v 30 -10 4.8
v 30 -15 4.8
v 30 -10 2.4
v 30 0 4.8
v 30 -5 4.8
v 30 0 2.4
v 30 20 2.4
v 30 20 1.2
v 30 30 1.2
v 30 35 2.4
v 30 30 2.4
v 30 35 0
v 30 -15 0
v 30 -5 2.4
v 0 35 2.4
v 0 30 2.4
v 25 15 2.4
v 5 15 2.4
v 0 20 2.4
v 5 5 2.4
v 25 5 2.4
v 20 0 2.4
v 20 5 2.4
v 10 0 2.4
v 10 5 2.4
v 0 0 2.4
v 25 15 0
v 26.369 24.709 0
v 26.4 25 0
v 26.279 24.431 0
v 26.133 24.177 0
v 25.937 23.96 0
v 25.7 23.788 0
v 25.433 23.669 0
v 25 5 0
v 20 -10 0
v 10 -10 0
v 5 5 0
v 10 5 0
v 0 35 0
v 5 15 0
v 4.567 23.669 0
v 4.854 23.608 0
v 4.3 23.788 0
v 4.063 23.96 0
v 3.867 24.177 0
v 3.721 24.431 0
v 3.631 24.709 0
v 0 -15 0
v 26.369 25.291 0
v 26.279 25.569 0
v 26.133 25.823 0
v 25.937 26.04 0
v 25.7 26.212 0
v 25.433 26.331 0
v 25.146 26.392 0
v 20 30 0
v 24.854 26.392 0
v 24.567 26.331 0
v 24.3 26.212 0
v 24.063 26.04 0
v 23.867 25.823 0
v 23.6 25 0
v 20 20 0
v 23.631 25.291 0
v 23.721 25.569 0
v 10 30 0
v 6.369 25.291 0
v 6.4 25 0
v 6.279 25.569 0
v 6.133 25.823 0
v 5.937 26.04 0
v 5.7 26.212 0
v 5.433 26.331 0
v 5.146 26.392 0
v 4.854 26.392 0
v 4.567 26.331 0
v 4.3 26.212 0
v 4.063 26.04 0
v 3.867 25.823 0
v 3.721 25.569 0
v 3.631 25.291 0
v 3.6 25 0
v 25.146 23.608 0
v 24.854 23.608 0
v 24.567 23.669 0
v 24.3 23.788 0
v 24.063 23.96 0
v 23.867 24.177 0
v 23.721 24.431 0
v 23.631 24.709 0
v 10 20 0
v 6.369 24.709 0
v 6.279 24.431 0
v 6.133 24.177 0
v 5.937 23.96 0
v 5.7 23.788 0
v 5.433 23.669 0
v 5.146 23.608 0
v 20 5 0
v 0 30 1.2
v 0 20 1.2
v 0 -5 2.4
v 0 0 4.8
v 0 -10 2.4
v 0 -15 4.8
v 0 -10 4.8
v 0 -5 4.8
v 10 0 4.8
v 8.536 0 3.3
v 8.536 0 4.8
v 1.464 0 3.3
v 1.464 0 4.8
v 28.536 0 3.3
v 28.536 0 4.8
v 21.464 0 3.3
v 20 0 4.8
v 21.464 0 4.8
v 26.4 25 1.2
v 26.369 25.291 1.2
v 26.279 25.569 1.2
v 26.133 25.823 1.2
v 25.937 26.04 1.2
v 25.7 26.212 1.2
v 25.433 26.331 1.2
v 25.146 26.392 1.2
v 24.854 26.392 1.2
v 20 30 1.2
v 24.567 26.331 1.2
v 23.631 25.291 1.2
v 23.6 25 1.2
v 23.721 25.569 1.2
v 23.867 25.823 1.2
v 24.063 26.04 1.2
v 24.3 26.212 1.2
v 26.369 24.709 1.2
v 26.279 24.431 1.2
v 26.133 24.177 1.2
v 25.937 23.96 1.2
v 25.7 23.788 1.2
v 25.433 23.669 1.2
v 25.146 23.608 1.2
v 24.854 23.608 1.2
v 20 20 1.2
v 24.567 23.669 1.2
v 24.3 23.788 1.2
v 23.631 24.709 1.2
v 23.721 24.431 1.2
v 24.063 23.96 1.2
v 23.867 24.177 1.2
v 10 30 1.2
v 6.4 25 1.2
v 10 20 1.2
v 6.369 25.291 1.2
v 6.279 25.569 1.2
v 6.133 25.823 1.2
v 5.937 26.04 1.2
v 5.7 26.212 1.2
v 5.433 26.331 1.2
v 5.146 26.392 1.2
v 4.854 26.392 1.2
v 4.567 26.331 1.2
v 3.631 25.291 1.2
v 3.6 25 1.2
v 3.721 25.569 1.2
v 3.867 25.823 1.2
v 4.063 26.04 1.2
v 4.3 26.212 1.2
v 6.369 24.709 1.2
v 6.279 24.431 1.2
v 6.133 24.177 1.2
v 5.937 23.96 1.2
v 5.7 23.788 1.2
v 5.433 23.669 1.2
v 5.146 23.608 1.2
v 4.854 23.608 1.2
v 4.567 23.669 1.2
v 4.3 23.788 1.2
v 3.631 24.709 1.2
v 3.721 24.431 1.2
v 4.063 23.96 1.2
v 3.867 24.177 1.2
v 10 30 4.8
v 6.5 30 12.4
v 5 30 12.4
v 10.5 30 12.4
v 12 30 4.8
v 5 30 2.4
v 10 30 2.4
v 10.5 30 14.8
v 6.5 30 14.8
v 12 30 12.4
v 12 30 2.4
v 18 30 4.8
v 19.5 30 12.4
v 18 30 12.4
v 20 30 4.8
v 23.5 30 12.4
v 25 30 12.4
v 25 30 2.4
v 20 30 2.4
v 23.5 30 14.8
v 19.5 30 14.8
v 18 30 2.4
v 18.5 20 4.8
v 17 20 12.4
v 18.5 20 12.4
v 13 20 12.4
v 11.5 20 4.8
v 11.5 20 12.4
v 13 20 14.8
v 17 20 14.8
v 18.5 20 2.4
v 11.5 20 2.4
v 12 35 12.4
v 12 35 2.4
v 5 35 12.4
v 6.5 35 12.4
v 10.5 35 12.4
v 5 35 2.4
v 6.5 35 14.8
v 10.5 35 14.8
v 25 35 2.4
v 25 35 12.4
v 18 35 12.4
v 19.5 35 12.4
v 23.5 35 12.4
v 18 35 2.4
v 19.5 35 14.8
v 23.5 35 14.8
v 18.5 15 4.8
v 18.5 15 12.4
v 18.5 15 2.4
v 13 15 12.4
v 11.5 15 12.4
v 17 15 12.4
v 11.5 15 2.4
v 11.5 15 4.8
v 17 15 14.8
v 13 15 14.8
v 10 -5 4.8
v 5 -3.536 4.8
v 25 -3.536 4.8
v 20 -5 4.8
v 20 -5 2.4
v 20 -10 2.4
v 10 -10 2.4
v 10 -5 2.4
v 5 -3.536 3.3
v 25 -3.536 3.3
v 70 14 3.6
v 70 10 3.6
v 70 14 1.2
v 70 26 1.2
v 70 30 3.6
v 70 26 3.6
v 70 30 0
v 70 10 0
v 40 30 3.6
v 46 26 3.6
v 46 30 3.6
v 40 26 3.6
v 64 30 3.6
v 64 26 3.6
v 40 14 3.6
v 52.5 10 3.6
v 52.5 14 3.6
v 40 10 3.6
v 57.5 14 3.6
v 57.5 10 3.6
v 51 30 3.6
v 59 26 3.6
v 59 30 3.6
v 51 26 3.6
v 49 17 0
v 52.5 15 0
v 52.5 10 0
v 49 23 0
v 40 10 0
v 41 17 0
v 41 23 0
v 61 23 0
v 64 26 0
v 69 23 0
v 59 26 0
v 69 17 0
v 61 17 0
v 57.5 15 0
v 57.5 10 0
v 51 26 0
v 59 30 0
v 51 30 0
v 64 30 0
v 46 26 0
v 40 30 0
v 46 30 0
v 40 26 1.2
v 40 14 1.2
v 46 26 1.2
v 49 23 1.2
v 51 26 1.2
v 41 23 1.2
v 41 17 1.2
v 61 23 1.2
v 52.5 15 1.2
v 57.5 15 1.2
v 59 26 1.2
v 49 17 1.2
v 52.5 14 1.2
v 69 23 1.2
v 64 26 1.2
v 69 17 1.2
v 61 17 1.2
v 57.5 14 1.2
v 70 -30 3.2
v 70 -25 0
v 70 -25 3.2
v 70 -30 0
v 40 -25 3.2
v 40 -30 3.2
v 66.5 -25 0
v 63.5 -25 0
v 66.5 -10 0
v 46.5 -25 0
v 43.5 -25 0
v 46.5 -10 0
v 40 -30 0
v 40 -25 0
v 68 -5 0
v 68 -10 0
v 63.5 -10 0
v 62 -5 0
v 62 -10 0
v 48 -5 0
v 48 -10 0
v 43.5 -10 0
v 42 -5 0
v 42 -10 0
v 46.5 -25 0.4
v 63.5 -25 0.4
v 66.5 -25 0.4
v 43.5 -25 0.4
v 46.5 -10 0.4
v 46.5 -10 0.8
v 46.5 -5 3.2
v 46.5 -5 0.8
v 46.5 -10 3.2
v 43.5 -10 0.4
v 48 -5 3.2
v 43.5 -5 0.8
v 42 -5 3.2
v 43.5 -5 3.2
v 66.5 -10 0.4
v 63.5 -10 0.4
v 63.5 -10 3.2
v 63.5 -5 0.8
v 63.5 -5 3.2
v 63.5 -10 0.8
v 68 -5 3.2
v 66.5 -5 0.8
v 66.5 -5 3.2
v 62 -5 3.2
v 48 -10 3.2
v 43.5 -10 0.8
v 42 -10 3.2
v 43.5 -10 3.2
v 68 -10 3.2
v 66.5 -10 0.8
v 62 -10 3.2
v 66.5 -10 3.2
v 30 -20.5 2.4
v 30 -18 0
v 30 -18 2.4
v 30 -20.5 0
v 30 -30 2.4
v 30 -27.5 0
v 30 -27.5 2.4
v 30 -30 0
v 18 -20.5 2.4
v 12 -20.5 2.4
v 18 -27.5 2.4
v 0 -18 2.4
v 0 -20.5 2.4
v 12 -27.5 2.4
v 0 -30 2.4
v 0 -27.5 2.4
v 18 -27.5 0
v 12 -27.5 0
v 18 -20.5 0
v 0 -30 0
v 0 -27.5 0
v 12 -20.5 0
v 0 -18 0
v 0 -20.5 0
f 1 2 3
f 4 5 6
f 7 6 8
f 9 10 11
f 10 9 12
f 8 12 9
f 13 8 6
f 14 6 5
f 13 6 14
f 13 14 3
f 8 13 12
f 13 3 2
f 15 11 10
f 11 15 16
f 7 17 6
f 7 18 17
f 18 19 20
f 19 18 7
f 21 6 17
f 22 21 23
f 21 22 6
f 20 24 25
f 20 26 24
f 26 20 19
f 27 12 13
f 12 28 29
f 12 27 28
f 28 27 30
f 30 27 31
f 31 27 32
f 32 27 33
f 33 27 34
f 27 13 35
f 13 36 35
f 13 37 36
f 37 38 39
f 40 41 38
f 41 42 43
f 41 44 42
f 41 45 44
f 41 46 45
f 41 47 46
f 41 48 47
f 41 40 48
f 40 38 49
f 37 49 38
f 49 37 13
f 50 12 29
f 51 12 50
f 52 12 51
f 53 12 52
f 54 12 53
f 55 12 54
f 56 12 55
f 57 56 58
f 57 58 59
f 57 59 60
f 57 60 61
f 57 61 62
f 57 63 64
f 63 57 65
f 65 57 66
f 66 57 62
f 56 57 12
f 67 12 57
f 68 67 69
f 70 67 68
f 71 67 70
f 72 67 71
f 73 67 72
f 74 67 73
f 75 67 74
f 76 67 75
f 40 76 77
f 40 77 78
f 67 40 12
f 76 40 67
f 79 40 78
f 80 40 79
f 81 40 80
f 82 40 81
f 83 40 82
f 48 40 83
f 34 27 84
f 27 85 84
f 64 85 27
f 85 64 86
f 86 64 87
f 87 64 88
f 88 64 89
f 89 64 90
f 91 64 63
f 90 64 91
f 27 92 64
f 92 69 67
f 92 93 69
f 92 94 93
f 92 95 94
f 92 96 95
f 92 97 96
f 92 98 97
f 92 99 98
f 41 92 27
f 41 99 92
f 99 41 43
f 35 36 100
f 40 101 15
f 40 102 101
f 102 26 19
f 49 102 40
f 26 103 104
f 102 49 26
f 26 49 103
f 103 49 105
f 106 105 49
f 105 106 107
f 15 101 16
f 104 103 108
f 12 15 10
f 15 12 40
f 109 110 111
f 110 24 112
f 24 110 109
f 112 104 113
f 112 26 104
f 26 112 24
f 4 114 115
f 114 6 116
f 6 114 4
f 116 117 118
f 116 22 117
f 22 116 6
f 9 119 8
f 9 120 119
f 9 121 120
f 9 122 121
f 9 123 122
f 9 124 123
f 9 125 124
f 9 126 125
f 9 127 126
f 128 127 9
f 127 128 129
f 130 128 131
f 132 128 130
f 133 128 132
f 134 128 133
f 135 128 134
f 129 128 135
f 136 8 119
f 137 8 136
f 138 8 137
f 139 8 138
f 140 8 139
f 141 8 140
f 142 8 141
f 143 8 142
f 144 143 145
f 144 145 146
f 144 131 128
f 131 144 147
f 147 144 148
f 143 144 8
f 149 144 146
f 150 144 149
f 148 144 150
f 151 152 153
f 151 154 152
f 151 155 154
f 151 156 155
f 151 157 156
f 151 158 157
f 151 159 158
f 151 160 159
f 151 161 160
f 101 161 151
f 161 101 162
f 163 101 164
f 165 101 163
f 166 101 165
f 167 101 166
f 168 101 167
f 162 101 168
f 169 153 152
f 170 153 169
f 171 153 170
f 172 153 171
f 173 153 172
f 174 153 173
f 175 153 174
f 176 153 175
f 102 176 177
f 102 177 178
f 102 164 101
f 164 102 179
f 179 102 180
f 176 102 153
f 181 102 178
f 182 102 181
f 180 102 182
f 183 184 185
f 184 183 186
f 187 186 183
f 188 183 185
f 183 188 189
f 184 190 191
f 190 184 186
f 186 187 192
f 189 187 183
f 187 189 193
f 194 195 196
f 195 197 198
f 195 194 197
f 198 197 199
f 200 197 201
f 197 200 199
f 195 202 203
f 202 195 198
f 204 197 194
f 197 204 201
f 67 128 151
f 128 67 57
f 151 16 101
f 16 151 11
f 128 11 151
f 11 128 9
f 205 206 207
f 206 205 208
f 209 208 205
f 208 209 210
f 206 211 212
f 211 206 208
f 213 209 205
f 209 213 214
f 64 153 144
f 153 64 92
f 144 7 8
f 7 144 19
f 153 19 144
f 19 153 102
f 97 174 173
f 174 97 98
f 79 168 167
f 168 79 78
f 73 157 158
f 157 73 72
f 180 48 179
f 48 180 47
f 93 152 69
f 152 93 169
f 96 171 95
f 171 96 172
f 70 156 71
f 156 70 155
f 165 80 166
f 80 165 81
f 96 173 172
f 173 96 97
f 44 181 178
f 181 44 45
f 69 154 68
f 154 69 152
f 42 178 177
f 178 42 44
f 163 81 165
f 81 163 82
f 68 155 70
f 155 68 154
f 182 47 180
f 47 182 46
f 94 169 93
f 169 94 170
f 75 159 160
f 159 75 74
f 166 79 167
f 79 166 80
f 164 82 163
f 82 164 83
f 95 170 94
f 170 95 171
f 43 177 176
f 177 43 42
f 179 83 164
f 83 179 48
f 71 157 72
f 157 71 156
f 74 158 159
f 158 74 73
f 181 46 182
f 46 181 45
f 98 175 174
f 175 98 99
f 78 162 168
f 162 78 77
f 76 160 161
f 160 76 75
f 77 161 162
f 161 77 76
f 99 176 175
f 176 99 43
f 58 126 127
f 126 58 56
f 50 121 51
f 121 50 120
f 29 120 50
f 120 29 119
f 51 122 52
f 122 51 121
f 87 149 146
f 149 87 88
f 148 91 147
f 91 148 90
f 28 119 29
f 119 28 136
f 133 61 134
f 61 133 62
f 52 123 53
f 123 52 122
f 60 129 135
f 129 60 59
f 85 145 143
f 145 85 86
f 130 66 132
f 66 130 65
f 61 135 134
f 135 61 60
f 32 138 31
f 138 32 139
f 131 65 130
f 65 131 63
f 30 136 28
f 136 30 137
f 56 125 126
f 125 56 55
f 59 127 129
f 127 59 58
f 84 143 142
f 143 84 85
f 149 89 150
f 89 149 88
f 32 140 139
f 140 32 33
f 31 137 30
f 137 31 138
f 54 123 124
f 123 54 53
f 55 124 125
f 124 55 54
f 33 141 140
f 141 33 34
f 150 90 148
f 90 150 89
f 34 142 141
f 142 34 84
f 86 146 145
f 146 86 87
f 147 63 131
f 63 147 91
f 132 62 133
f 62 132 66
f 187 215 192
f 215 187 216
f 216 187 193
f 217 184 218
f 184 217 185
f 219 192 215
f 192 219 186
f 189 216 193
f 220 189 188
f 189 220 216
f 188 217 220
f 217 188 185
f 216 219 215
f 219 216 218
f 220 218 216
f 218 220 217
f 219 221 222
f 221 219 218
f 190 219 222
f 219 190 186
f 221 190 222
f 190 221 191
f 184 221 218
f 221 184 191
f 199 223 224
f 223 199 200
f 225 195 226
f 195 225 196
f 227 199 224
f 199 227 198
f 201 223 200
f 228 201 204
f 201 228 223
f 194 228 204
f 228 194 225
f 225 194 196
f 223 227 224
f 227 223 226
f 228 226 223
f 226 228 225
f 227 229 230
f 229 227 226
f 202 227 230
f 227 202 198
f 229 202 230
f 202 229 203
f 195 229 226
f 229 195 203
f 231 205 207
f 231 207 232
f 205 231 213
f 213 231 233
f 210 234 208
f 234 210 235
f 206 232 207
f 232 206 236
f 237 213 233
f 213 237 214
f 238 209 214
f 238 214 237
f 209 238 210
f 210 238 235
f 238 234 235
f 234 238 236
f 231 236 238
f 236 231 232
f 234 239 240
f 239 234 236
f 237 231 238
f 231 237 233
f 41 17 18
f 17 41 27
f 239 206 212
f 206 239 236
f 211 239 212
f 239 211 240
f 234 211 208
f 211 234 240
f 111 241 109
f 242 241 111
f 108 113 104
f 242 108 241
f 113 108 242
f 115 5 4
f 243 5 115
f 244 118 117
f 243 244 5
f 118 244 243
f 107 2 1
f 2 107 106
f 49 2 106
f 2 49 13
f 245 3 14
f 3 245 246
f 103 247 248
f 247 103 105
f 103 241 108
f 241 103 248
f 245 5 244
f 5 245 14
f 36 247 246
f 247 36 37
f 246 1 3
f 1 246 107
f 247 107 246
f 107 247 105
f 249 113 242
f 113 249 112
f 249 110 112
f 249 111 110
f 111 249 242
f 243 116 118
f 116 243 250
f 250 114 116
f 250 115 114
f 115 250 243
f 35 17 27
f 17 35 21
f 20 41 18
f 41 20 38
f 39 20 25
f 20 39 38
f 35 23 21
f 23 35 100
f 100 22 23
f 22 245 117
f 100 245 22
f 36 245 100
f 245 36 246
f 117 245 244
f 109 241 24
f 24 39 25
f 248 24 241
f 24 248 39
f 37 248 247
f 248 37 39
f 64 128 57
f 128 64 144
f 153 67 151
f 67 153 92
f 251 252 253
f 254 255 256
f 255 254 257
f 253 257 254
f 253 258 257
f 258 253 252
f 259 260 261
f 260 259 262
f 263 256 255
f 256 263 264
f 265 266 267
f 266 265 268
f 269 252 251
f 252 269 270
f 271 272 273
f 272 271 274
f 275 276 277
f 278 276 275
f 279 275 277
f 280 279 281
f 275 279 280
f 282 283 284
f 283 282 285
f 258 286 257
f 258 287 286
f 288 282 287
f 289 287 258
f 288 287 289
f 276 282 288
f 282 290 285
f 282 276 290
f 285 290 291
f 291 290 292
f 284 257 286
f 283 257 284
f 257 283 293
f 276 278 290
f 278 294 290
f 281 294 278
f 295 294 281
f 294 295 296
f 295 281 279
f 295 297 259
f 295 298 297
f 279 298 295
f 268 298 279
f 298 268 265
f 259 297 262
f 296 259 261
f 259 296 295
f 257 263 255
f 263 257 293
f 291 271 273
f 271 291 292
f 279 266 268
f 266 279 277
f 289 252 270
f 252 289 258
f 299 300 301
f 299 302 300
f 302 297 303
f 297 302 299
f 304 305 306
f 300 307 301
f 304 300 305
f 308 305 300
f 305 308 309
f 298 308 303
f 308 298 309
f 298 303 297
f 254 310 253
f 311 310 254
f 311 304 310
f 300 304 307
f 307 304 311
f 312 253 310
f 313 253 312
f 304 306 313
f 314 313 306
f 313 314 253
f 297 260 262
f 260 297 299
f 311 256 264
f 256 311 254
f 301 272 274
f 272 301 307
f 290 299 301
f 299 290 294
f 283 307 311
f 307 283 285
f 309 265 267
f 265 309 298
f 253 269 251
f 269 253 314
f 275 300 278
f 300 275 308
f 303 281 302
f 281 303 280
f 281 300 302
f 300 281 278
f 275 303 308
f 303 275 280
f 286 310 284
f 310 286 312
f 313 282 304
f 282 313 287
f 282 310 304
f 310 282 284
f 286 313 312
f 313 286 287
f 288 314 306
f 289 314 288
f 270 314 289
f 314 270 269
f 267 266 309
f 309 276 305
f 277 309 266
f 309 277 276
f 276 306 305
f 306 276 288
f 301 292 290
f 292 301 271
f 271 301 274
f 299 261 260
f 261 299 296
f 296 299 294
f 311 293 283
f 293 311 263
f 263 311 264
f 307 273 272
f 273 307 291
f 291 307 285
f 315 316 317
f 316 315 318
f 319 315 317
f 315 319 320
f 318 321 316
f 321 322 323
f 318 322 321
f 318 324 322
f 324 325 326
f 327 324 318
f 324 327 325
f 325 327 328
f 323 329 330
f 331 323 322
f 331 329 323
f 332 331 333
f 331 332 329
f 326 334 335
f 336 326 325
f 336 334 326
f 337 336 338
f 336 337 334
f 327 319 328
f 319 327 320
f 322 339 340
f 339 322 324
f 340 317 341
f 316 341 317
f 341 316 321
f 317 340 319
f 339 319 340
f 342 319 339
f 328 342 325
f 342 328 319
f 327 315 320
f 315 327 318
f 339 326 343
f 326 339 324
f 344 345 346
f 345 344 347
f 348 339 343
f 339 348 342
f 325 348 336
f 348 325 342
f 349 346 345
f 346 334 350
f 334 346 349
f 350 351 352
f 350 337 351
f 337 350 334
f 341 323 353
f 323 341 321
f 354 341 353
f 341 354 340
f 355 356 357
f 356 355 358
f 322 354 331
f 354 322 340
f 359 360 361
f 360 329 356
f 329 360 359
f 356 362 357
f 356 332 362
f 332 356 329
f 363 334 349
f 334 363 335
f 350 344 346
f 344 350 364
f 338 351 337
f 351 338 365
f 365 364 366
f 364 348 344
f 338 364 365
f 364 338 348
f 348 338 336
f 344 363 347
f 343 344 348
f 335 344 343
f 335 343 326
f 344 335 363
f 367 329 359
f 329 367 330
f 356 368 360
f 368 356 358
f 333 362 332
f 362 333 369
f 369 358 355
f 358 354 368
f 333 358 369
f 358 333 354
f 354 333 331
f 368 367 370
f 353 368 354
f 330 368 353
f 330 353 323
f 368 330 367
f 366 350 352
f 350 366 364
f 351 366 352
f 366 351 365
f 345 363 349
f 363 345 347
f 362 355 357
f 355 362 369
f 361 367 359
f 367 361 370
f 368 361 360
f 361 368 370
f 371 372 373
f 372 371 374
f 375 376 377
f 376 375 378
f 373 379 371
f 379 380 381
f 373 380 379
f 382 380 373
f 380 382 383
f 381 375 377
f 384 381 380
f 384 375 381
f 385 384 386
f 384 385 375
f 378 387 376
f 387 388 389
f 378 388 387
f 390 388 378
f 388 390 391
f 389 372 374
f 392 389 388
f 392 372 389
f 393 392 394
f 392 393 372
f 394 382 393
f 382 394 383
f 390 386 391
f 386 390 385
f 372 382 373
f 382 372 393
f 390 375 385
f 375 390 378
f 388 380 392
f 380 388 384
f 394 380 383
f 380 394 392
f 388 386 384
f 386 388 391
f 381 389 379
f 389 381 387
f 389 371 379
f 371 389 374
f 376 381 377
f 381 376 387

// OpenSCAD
module basepillar()
{
  cube(size=[7,5,10]);
  translate(v=[1.5,0,10])
    cube(size=[4,5,2.4]);
}

module base()
{
  union()
  {
    difference()
    {
      cube(size=[30,35,2.4]);

      translate(v=[0,20,1.2])
      {
        cube(size=[30,10,1.2]);
      }

      translate(v=[5,25,0])
        cylinder(h=2.4,r=1.4,center=true,$fs=0.1);

      translate(v=[25,25,0])
        cylinder(h=2.4,r=1.4,center=true,$fs=0.1);
    }

    translate(v=[5,30,2.4])
      basepillar();

    translate(v=[18,30,2.4])
      basepillar();

    translate(v=[11.5,15,2.4])
      basepillar();
  }
}

module polerack()
{
  difference()
  {
    translate(v=[0,-15,0])
      cube(size=[30,15,4.8]);

    translate(v=[0,-10,2.4])
      cube(size=[30,5,2.4]);

    translate(v=[5,0,4.8-1.5/2])
      rotate([0,0,45])
        cube(size=[5,5,1.5],center=true);

    translate(v=[25,0,4.8-1.5/2])
      rotate([0,0,45])
        cube(size=[5,5,1.5],center=true);
  }
}

module coilholder()
{
  difference()
  {
    cube(size=[30,20,3.6]);

    translate(v=[0,4,1.2])
    {
      cube(size=[30,12,2.4]);
    }

    translate(v=[5,10,1.2])
      cube(size=[8,6,2.4],center=true);

    translate(v=[25,10,1.2])
      cube(size=[8,6,2.4],center=true);

    translate(v=[12.5,0,0])
      cube(size=[5,5,3.6]);

    translate(v=[6,16,0])
      cube(size=[5,4,3.6]);

    translate(v=[19,16,0])
      cube(size=[5,4,3.6]);
  }
}

module tangs()
{
  cube(size=[30,5,2.4+0.8]);

  translate(v=[3.5,5,0])
    cube(size=[3,20,0.4]);

  translate(v=[23.5,5,0])
    cube(size=[3,20,0.4]);

  translate(v=[2,20,0])
    cube(size=[6,5,0.8]);

  translate(v=[22,20,0])
    cube(size=[6,5,0.8]);

  translate(v=[2,20,0])
    cube(size=[1.5,5,3.2]);
  translate(v=[6.5,20,0])
    cube(size=[1.5,5,3.2]);

  translate(v=[22,20,0])
    cube(size=[1.5,5,3.2]);
  translate(v=[26.5,20,0])
    cube(size=[1.5,5,3.2]);
}

module coilgrip()
{
  difference()
  {
    cube(size=[30,12,2.4]);

    translate(v=[0,2.5,0])
      cube(size=[12,7,2.4]);

    translate(v=[18,2.5,0])
      cube(size=[12,7,2.4]);
  }
}

union()
{
  difference()
  {
    union()
    {
      base();

      polerack();
    }

    translate(v=[5,5,0])
      cube(size=[20,10,2.4]);

    translate(v=[10,-10,0])
      cube(size=[10,25,4.8]);
    translate(v=[10,20,0])
      cube(size=[10,10,4.8]);
  }

  translate(v=[40,10,0])
    coilholder();

  translate(v=[40,-30,0])
    tangs();

  translate(v=[0,-30,0])
    coilgrip();
}
